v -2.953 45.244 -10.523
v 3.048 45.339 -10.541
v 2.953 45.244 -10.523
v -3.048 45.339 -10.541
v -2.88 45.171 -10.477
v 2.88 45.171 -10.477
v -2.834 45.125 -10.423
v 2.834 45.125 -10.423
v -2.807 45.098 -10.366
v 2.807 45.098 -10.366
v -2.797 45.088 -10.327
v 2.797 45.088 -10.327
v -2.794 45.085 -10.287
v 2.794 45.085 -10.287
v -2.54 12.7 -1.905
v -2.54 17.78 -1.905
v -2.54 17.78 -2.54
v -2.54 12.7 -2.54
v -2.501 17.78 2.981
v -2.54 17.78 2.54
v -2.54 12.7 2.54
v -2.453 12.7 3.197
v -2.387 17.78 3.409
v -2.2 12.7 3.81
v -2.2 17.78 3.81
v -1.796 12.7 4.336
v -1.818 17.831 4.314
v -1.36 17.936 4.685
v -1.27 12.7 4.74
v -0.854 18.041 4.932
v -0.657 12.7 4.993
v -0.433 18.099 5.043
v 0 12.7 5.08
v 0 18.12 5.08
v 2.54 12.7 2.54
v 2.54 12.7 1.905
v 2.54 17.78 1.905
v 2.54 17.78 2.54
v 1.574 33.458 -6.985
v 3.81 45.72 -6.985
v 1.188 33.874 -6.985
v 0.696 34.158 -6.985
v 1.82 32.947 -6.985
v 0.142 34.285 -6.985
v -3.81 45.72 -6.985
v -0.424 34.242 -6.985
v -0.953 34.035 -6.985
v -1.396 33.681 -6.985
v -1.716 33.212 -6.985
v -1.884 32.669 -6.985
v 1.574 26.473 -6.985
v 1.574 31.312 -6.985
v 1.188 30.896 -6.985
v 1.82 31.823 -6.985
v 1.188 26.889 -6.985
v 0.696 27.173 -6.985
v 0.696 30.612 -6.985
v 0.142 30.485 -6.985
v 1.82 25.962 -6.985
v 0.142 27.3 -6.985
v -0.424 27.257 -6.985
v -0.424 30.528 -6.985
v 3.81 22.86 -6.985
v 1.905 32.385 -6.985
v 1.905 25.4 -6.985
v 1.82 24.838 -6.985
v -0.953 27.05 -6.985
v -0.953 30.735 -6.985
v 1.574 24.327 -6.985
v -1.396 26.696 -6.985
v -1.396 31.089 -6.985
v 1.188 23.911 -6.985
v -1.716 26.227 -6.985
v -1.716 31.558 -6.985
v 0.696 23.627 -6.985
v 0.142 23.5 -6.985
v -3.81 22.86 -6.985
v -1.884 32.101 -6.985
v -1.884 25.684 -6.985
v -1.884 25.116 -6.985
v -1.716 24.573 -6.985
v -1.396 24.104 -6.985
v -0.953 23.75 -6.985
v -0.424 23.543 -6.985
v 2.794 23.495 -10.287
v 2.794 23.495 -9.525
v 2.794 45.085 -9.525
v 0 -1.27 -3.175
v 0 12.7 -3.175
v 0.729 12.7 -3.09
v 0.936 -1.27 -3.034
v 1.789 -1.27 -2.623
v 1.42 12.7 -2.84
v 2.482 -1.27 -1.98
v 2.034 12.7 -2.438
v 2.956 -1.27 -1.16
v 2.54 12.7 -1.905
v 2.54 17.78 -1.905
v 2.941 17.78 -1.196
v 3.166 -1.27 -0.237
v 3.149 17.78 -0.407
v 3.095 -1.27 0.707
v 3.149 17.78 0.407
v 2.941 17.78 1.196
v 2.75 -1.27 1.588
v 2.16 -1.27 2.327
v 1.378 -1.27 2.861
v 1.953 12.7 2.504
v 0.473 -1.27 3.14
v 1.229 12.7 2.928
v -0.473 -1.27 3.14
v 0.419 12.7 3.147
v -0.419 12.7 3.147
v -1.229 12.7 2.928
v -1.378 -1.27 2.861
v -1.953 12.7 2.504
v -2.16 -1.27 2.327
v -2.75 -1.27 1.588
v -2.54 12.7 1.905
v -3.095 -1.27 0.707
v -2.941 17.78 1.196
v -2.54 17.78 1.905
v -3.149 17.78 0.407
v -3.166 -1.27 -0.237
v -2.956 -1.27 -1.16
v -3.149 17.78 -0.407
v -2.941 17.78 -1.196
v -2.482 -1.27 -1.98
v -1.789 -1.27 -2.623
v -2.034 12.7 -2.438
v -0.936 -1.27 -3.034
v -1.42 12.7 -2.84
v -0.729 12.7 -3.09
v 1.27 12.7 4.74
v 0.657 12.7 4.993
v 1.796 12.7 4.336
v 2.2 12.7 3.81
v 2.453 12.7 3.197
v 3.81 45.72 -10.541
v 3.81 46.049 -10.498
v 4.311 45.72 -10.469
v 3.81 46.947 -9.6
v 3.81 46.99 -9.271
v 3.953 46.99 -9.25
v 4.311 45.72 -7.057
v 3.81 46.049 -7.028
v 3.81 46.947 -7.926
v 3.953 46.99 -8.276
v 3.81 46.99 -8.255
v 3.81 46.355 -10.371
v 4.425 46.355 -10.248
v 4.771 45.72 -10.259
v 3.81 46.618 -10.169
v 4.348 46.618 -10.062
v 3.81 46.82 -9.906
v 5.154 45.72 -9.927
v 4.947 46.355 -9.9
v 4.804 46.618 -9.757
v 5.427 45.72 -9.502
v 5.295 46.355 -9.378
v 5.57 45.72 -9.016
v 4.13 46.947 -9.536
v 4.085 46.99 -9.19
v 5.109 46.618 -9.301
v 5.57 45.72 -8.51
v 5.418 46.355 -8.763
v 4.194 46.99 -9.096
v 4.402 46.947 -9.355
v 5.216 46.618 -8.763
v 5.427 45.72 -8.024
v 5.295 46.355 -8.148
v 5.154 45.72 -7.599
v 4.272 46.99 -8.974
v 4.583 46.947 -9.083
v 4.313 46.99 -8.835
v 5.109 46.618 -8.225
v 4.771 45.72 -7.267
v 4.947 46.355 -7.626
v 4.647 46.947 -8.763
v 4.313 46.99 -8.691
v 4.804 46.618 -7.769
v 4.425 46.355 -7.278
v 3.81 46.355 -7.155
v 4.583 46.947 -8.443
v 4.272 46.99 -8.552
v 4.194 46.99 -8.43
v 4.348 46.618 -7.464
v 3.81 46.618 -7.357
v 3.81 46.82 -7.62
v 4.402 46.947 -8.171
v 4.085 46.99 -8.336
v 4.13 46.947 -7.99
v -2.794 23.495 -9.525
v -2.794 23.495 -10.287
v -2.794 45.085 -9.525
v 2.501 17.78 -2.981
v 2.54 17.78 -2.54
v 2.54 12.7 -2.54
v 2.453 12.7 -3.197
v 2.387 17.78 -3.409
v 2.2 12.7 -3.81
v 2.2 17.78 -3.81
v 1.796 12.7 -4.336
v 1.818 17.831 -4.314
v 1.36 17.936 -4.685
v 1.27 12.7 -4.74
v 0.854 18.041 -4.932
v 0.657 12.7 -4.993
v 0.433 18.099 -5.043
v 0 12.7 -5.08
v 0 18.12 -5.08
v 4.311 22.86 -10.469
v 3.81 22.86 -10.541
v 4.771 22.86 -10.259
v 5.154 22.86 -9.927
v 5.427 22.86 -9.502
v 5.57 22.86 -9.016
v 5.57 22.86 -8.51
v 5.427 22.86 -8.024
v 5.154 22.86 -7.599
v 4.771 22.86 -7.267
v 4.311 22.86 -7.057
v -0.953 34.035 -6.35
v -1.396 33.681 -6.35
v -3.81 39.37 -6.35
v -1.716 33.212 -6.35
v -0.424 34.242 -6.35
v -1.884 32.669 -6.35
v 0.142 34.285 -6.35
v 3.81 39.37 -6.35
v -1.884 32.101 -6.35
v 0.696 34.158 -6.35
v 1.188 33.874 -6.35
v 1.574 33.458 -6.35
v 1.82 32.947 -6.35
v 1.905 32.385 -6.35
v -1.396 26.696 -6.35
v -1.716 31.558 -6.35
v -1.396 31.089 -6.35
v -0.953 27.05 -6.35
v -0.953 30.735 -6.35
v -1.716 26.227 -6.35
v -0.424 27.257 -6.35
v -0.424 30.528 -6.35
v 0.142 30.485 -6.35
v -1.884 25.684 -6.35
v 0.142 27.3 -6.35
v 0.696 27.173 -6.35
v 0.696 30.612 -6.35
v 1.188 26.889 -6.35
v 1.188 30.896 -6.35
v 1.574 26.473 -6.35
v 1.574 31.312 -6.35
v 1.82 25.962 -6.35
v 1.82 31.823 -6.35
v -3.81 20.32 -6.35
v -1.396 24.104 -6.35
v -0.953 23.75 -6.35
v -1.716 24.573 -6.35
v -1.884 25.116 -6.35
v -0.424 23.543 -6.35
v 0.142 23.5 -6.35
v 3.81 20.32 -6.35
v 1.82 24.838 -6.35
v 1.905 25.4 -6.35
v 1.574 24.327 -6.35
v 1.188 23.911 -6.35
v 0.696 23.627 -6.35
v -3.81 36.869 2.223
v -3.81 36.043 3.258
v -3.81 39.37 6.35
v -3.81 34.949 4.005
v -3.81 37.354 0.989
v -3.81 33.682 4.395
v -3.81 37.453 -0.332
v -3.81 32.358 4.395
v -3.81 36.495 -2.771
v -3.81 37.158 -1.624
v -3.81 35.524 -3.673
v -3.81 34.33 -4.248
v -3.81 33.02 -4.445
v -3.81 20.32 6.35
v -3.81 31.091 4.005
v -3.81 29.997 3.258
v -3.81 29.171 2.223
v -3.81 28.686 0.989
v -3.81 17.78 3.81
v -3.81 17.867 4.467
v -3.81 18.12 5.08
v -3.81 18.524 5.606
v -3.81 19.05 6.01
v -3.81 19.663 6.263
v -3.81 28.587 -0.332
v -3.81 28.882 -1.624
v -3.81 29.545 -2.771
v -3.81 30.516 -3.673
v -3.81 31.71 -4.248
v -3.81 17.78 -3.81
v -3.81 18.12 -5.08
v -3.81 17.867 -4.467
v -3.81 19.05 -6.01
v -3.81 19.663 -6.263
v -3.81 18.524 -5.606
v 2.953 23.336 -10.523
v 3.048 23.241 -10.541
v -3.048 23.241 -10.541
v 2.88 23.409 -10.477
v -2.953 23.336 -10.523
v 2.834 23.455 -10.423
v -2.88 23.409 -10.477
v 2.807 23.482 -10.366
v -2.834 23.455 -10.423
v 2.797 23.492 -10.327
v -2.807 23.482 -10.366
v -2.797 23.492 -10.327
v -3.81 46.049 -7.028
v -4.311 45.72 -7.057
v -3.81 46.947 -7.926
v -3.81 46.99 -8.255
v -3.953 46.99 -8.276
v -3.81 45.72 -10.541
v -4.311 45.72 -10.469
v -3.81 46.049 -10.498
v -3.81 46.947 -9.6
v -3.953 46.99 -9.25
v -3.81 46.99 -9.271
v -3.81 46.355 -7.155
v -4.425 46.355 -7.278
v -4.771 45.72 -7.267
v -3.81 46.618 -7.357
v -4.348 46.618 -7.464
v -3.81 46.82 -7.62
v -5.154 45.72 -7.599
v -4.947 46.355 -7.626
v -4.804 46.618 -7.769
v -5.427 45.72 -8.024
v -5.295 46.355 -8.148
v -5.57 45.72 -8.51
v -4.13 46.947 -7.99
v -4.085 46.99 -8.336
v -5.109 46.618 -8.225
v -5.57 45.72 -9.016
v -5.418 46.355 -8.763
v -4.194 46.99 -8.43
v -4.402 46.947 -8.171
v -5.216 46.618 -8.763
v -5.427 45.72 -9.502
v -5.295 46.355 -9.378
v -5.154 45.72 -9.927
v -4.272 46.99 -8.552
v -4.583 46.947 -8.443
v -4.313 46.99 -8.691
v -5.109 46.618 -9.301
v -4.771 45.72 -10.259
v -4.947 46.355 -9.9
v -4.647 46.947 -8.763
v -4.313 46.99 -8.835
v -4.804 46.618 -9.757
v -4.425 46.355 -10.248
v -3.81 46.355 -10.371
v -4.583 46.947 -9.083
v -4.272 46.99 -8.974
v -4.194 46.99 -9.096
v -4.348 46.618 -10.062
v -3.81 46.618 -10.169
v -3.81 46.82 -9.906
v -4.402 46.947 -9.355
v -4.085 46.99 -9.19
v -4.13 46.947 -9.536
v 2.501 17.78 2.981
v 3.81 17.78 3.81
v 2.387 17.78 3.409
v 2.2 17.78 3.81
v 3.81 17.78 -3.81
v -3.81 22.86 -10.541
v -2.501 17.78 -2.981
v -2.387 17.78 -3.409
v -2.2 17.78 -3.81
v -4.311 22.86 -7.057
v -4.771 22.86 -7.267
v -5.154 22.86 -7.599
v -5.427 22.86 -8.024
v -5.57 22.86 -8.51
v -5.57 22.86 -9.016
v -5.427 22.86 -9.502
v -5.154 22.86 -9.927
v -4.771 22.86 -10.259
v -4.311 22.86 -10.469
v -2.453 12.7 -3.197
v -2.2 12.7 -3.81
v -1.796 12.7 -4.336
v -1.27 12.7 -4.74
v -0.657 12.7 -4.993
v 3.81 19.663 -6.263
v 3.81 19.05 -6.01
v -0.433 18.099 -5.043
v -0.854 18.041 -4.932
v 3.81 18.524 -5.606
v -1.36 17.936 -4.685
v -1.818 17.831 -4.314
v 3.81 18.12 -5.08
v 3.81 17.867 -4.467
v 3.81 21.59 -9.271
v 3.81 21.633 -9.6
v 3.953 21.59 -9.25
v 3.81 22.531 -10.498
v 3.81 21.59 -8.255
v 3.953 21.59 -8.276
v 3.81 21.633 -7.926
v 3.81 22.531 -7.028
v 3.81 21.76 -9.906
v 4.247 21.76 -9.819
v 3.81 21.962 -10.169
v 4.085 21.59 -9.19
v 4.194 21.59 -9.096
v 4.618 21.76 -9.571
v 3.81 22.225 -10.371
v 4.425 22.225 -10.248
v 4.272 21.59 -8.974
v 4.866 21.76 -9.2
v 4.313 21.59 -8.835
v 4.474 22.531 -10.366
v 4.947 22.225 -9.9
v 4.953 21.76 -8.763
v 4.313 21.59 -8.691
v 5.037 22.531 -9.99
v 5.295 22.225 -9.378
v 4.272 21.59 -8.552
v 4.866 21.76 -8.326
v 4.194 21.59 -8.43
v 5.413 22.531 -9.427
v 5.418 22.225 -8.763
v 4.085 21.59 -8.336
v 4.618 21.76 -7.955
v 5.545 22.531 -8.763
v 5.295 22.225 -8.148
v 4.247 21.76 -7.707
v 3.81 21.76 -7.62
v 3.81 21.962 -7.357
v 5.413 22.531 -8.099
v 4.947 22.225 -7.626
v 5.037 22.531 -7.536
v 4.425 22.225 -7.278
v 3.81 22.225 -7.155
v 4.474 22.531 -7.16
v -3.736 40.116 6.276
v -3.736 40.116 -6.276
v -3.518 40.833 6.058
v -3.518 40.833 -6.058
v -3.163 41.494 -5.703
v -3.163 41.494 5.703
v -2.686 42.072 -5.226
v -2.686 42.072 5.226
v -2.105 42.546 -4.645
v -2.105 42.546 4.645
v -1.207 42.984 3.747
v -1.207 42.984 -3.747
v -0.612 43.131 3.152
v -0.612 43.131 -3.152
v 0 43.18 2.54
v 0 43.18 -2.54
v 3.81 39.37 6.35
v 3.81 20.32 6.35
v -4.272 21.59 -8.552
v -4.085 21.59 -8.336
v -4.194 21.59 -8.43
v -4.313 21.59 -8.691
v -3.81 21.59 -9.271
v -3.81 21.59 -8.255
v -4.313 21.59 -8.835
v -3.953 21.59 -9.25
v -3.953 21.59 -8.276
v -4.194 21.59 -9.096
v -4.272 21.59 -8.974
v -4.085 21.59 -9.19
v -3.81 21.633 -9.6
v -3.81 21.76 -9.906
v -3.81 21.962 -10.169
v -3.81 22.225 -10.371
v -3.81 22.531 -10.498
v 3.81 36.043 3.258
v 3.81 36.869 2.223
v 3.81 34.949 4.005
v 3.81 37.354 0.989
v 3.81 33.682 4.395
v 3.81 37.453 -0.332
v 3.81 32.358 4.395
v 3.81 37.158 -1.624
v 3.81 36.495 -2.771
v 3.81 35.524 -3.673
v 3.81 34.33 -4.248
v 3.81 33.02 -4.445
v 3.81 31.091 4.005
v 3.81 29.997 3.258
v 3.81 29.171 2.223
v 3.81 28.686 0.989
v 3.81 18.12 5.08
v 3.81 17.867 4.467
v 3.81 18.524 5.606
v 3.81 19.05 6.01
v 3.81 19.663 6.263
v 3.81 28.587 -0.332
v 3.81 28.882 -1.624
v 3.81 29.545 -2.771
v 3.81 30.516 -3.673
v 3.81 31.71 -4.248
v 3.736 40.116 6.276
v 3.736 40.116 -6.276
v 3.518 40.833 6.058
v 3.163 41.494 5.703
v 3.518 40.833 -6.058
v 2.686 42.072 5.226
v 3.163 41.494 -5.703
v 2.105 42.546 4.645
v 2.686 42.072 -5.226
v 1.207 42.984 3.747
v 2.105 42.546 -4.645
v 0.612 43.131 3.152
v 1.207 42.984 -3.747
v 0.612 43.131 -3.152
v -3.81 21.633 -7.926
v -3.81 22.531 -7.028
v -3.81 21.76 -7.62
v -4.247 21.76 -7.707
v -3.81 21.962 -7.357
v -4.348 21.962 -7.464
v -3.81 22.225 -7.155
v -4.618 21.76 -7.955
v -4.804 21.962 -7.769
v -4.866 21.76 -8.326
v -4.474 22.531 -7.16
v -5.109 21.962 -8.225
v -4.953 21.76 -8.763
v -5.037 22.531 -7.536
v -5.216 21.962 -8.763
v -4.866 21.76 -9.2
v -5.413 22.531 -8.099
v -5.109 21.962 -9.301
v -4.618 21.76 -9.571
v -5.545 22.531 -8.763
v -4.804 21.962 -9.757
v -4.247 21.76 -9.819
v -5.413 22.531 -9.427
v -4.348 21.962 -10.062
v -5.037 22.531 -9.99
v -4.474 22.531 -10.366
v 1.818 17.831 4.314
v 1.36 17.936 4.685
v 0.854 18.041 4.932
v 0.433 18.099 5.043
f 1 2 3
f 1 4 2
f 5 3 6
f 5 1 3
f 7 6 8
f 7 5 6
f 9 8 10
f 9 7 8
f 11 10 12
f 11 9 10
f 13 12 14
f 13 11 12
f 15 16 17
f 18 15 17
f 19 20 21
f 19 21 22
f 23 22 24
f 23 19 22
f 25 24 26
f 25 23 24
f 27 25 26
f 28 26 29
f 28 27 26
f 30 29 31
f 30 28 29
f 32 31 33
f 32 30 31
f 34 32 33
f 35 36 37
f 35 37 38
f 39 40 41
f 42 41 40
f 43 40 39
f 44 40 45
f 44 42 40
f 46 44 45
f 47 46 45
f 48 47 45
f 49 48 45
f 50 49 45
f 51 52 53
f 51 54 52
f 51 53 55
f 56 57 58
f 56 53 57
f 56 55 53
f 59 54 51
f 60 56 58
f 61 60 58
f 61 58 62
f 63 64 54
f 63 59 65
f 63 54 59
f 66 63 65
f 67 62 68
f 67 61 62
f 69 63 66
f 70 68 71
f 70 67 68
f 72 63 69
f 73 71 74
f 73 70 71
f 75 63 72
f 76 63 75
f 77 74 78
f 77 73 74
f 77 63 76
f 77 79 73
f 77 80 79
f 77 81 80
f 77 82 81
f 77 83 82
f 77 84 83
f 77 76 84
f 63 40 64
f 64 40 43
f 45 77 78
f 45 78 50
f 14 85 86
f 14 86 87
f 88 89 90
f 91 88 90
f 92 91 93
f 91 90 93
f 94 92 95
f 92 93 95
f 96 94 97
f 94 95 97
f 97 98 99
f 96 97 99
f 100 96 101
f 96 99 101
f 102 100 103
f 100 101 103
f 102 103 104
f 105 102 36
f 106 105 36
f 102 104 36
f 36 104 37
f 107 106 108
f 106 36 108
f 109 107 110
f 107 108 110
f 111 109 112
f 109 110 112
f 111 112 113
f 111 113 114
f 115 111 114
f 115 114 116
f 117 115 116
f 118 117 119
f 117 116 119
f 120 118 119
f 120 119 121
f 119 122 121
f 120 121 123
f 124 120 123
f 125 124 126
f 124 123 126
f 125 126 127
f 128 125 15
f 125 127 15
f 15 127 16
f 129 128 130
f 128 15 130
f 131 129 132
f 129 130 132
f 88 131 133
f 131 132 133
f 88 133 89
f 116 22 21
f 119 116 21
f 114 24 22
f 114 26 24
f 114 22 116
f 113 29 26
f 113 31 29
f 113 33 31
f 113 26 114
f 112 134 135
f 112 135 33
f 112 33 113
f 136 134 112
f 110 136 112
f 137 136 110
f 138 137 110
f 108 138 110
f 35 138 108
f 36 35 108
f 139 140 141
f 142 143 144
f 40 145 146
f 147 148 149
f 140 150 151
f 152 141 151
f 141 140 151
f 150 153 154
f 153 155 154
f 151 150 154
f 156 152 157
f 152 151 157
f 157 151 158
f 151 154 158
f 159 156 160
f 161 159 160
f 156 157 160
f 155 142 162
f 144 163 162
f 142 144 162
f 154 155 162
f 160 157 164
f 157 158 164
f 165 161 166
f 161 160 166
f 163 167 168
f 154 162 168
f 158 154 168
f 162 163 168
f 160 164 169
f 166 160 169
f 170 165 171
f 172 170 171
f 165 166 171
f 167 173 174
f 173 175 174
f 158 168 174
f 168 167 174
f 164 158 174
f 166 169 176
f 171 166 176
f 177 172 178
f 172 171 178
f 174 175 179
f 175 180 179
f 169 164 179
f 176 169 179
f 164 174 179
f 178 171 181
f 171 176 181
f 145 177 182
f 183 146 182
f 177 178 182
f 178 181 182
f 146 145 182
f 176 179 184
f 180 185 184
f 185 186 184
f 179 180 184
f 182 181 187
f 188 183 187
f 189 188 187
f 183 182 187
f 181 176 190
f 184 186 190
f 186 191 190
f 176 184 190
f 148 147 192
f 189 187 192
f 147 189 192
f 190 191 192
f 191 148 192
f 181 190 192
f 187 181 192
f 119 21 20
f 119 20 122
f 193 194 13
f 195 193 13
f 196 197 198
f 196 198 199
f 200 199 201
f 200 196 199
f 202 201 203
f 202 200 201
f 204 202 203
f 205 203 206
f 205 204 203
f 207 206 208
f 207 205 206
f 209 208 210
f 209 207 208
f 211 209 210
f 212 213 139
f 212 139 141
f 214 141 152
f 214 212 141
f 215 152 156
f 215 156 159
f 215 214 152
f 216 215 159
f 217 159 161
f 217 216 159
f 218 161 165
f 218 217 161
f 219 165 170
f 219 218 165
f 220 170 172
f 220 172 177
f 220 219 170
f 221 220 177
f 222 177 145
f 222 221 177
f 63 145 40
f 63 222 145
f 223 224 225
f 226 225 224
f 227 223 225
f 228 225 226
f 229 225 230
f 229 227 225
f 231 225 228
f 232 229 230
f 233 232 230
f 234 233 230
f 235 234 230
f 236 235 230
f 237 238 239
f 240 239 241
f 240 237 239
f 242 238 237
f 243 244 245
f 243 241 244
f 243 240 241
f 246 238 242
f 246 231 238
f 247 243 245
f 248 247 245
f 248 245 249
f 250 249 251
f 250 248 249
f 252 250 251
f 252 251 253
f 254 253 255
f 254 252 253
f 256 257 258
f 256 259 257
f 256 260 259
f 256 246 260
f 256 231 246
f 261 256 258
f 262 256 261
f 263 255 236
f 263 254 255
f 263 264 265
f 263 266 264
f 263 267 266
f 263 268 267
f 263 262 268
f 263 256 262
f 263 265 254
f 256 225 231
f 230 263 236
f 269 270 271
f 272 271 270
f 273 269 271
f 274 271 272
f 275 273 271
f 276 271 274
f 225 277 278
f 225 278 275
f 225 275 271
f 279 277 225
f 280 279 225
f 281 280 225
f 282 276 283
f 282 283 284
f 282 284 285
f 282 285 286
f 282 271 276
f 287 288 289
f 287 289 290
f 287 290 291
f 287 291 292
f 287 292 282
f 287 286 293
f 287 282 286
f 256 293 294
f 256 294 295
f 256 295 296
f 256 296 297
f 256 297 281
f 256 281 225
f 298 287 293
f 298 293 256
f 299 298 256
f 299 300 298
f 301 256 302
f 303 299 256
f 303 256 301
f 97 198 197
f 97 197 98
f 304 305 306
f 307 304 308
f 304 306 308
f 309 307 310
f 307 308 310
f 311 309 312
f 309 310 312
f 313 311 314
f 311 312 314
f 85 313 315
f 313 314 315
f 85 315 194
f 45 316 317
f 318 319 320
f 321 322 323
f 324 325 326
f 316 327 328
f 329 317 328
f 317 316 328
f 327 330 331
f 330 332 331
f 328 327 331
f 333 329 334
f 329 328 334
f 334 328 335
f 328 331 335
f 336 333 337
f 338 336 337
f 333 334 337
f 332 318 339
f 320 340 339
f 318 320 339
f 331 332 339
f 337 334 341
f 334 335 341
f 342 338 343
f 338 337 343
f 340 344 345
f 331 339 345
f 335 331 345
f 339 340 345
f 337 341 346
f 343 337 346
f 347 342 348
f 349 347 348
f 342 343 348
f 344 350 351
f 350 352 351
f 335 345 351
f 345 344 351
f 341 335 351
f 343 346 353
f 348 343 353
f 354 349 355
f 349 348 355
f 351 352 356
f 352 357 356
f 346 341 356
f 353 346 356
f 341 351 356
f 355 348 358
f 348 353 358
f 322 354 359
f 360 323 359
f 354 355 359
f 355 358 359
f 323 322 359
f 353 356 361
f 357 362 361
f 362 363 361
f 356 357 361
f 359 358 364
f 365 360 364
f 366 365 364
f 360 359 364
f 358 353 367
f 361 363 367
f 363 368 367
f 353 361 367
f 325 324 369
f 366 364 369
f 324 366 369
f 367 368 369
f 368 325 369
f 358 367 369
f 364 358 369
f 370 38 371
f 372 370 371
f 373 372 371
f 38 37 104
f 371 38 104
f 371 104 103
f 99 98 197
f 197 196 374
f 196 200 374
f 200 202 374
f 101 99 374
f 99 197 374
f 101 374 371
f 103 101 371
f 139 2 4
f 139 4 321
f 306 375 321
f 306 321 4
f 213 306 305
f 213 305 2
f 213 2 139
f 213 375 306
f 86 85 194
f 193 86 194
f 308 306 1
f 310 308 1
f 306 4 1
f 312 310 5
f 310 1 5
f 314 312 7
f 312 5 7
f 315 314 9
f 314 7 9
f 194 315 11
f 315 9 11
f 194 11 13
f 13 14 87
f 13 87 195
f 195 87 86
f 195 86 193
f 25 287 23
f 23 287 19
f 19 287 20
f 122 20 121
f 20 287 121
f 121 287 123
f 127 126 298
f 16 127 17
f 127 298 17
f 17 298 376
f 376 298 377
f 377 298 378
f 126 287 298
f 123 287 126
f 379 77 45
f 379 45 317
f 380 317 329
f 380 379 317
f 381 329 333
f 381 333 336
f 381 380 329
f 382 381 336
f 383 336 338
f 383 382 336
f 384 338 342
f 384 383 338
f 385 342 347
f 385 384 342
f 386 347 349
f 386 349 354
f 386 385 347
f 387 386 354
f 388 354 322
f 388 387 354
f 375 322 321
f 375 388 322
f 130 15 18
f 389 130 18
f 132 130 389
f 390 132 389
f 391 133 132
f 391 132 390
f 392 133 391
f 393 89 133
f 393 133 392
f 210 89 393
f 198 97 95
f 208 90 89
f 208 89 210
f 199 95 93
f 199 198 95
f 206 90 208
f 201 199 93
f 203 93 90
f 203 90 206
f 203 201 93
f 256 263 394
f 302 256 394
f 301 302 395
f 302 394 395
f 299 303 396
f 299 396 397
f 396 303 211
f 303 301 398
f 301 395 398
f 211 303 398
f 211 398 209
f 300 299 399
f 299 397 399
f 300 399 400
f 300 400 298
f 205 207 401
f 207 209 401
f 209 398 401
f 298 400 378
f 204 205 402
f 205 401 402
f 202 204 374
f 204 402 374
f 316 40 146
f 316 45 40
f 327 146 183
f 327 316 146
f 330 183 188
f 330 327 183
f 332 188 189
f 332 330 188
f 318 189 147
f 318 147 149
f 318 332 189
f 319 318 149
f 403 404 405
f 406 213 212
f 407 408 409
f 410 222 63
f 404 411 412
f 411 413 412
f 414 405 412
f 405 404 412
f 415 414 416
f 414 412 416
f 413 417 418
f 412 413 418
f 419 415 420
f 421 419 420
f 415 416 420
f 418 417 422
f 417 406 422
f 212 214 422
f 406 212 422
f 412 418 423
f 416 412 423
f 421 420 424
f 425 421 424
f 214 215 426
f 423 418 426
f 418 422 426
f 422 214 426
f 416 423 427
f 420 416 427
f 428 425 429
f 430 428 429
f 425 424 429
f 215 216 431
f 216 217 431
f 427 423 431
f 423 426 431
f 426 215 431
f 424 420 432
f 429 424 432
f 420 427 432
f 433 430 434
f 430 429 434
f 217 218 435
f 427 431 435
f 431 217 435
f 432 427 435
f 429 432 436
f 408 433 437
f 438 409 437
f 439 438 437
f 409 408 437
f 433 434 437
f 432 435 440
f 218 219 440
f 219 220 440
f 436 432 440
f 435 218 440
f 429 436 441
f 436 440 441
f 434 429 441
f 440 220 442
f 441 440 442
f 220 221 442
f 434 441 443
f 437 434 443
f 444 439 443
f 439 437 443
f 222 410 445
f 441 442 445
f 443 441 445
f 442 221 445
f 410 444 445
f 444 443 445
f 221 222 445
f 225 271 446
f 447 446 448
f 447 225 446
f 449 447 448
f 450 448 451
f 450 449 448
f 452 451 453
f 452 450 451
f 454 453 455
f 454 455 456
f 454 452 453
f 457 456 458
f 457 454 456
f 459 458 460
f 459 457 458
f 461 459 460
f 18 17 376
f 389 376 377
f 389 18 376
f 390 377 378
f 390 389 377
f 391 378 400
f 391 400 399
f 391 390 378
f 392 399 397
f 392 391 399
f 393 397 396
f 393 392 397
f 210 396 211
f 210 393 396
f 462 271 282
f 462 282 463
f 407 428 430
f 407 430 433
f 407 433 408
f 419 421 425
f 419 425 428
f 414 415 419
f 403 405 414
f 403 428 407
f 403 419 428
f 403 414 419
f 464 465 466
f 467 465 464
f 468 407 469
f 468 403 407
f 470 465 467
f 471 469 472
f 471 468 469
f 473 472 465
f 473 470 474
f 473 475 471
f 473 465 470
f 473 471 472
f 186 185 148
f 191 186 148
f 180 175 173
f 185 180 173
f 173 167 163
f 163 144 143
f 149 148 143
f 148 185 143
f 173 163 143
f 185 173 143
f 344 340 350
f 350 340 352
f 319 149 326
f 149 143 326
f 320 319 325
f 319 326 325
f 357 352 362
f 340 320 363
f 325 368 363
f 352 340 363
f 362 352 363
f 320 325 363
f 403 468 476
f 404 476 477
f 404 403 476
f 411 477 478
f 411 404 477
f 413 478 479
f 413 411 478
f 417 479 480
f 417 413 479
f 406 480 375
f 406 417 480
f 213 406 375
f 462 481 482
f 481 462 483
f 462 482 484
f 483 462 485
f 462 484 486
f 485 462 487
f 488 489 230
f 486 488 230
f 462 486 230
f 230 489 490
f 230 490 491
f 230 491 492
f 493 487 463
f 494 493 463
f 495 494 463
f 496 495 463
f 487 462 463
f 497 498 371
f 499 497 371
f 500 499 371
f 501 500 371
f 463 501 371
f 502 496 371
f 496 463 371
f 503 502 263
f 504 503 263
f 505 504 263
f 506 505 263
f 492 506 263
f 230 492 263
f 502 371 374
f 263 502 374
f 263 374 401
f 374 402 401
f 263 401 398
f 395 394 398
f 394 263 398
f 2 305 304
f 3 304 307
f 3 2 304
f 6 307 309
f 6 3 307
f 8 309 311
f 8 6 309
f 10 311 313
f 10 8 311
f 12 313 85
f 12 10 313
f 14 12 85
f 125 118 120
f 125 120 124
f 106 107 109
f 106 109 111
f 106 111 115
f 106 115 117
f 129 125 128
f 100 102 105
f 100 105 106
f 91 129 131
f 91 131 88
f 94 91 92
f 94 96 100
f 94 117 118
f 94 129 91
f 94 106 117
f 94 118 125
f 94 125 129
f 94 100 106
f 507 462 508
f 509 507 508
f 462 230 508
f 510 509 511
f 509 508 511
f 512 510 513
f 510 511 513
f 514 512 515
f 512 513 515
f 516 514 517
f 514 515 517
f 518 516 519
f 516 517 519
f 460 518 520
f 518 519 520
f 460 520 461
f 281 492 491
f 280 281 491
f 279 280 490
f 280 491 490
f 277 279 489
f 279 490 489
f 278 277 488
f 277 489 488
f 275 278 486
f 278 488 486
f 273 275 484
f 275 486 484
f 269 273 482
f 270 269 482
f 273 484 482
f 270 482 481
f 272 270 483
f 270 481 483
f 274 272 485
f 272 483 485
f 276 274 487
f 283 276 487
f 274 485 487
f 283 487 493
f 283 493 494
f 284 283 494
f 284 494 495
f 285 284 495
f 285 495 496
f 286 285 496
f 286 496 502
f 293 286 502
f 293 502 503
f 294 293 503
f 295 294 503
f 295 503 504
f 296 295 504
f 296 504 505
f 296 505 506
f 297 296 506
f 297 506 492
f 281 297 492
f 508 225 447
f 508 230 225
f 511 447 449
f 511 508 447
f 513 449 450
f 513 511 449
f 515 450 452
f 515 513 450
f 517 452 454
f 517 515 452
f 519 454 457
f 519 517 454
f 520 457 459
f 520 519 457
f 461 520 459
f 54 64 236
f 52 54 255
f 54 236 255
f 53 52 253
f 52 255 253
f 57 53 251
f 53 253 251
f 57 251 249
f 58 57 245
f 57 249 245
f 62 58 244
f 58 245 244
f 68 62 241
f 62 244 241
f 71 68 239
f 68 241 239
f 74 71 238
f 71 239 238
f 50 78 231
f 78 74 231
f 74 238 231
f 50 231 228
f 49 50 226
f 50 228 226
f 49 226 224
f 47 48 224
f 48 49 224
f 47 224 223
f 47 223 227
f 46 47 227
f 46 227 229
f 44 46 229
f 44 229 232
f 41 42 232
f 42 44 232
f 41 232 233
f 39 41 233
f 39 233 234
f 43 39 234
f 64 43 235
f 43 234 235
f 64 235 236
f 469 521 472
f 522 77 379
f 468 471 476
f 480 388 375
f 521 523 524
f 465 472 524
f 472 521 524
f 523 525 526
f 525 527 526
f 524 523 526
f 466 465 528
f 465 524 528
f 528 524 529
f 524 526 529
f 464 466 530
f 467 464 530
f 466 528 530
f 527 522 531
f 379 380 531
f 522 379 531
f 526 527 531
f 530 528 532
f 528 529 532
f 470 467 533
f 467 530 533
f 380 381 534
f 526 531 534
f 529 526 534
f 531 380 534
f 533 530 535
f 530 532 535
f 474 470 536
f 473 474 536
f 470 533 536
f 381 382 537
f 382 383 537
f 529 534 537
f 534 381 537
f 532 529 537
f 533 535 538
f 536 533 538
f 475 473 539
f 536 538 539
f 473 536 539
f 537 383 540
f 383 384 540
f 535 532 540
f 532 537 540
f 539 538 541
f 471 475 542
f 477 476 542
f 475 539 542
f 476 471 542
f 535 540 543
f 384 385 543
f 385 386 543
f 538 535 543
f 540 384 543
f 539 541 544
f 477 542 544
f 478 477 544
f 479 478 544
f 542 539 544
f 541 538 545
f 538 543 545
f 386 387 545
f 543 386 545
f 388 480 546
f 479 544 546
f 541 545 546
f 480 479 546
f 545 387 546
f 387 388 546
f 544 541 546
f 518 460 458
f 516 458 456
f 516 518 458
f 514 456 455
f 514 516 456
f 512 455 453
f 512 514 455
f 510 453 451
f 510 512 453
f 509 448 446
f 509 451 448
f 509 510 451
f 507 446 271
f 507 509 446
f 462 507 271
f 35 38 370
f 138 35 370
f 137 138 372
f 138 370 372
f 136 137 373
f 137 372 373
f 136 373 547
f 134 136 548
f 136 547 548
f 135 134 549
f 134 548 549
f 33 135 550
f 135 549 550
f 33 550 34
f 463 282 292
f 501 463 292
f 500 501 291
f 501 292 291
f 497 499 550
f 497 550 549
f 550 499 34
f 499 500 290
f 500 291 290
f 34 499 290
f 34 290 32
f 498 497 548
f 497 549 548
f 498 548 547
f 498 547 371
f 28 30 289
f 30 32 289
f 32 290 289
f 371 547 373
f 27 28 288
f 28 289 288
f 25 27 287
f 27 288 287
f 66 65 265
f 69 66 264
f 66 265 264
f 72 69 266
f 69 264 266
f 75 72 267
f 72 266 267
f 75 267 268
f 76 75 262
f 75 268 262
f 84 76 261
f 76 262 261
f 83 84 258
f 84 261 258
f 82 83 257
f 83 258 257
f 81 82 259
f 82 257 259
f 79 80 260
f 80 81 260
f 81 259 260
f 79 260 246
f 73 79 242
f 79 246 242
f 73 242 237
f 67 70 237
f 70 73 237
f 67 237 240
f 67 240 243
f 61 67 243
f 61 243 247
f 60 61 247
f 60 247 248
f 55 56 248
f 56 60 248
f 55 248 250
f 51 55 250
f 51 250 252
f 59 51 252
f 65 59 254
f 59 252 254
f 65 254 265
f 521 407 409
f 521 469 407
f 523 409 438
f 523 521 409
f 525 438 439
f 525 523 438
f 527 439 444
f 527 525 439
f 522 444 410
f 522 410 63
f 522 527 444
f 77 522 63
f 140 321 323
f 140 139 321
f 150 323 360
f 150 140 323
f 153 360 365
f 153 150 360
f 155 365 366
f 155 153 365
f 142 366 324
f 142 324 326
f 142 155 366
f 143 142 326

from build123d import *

# Parameters (mm, degrees)
SKETCH1_W                = 15.24
SKETCH1_H                = 25.4
BOSS_EXTRUDE1_DEPTH      = 5.08
FILLET1_R                = 2.54
SKETCH2_R                = 3.175
BOSS_EXTRUDE2_DEPTH      = 6.35
SKETCH3_W                = 5.08
SKETCH3_H                = 10.16
BOSS_EXTRUDE3_DEPTH      = 5.08
SKETCH4_W                = 7.62
SKETCH4_H                = 12.7
BOSS_EXTRUDE4_DEPTH      = 25.4
FILLET2_R                = 2.54
FILLET3_R                = 3.81
SKETCH5_R                = 1.905
BOSS_EXTRUDE5_DEPTH      = 1.27
BOSS_EXTRUDE6_DEPTH      = 25.4
FILLET4_R                = 1.27
SKETCH7_W                = 5.588
SKETCH7_H                = 21.59
CUT_EXTRUDE1_DEPTH       = 1.016
FILLET5_R                = 0.254
CUT_EXTRUDE2_REACH       = 52.512
SKETCH8_R                = 4.445
FILLET6_R                = 0.635
CUT_EXTRUDE3_REACH       = 55.308
SKETCH9_W                = 15.24
SKETCH9_H                = 25.4
BOSS_EXTRUDE7_DEPTH      = 13.97
BOSS_EXTRUDE7_DEPTH_BACK = 5.08
SKETCH10_R               = 3.175
FILLET7_R                = 2.54


# Some blends are built 0.0001 mm under size
with BuildPart() as part:
    # Sketch1 → Boss-Extrude1 (new, symmetric)
    with BuildSketch(Plane(origin=(0, 0, 0), x_dir=(0, 0, -1), z_dir=(1, 0, 0))):
        Rectangle(SKETCH1_W, SKETCH1_H)
    extrude(amount=BOSS_EXTRUDE1_DEPTH, both=True)

    # Fillet1
    fillet1_edges = [part.edges().sort_by_distance(p)[0] for p in [
        (5.08, 0, 7.62),
        (5.08, -12.7, 0),
        (5.08, 0, -7.62),
        (-5.08, -12.7, 0),
        (-5.08, 0, 7.62),
        (-5.08, 12.7, 0),
        (-5.08, 0, -7.62),
        (5.08, 12.7, 0),
        (0, -12.7, -7.62),
        (0, -12.7, 7.62),
        (0, 12.7, 7.62),
        (0, 12.7, -7.62),
    ]]
    fillet(fillet1_edges, radius=FILLET1_R)

    # Sketch2 → Boss-Extrude2 (add)
    with BuildSketch(Plane(origin=(5.08, 0, 0), x_dir=(0, 0, -1), z_dir=(1, 0, 0))):
        with Locations(Location((0, 6.985, 0), (0, 0, 90))):
            Circle(SKETCH2_R)
        with Locations(Location((0, -6.985, 0), (0, 0, 270))):
            Circle(SKETCH2_R)
    boss_extrude2 = extrude(amount=BOSS_EXTRUDE2_DEPTH)

    # Mirror1: Boss-Extrude2 across plane
    add(boss_extrude2.mirror(Plane(origin=(0, 0, 0), x_dir=(0, 0, 1), z_dir=(1, 0, 0))))

    # Sketch3 → Boss-Extrude3 (add)
    with BuildSketch(Plane(origin=(0, 12.7, 0), x_dir=(1, 0, 0), z_dir=(0, 1, 0))):
        Rectangle(SKETCH3_W, SKETCH3_H)
    extrude(amount=BOSS_EXTRUDE3_DEPTH)

    # Sketch4 → Boss-Extrude4 (add)
    with BuildSketch(Plane(origin=(0, 17.78, 0), x_dir=(1, 0, 0), z_dir=(0, 1, 0))):
        Rectangle(SKETCH4_W, SKETCH4_H)
    extrude(amount=BOSS_EXTRUDE4_DEPTH)

    # Fillet2
    # the kernel refuses this fillet: 2.54 mm, written as the material it takes off along each edge
    with BuildSketch(Plane(origin=(10.16, 17.78, -6.35), x_dir=(0, 0, 1), z_dir=(-1, 0, 0))) as fillet2_piece_1_section:
        with BuildLine():
            CenterArc((FILLET2_R, FILLET2_R), FILLET2_R, 180, 90)
            Line((0, FILLET2_R), (0, 0))
            Line((0, 0), (FILLET2_R, 0))
        make_face()
    fillet2_piece_1 = extrude(amount=20.32, mode=Mode.PRIVATE)
    fillet2_piece_1 = split(fillet2_piece_1, bisect_by=Plane(origin=(6.35, 17.840981289, -5.08), z_dir=(0, 0, 1)), keep=Keep.TOP, mode=Mode.PRIVATE)
    fillet2_piece_1 = split(fillet2_piece_1, bisect_by=Plane(origin=(2.54, 17.840981289, -4.665343007), z_dir=(1, 0, 0)), keep=Keep.TOP, mode=Mode.PRIVATE)
    add(fillet2_piece_1, mode=Mode.SUBTRACT)
    with BuildSketch(Plane(origin=(10.16, 17.78, -6.35), x_dir=(0, 0, 1), z_dir=(-1, 0, 0))) as fillet2_piece_2_section:
        with BuildLine():
            CenterArc((FILLET2_R, FILLET2_R), FILLET2_R, 180, 90)
            Line((0, FILLET2_R), (0, 0))
            Line((0, 0), (FILLET2_R, 0))
        make_face()
    fillet2_piece_2 = extrude(amount=20.32, mode=Mode.PRIVATE)
    fillet2_piece_2 = split(fillet2_piece_2, bisect_by=Plane(origin=(6.35, 18.428004952, -5.08), z_dir=(0, 0, -1)), keep=Keep.TOP, mode=Mode.PRIVATE)
    fillet2_piece_2 = split(fillet2_piece_2, bisect_by=Plane(origin=(2.54, 18.428004952, -5.932444919), z_dir=(1, 0, 0)), keep=Keep.TOP, mode=Mode.PRIVATE)
    add(fillet2_piece_2, mode=Mode.SUBTRACT)
    with BuildSketch(Plane(origin=(10.16, 17.78, -6.35), x_dir=(0, 0, 1), z_dir=(-1, 0, 0))) as fillet2_piece_3_section:
        with BuildLine():
            CenterArc((FILLET2_R, FILLET2_R), FILLET2_R, 180, 90)
            Line((0, FILLET2_R), (0, 0))
            Line((0, 0), (FILLET2_R, 0))
        make_face()
    fillet2_piece_3 = extrude(amount=20.32, mode=Mode.PRIVATE)
    fillet2_piece_3 = split(fillet2_piece_3, bisect_by=Plane(origin=(0, 18.428004952, -5.08), z_dir=(0, 0, -1)), keep=Keep.TOP, mode=Mode.PRIVATE)
    fillet2_piece_3 = split(fillet2_piece_3, bisect_by=Plane(origin=(-2.54, 18.428004952, -5.932444919), z_dir=(1, 0, 0)), keep=Keep.TOP, mode=Mode.PRIVATE)
    fillet2_piece_3 = split(fillet2_piece_3, bisect_by=Plane(origin=(2.54, 18.428004952, -5.932444919), z_dir=(-1, 0, 0)), keep=Keep.TOP, mode=Mode.PRIVATE)
    add(fillet2_piece_3, mode=Mode.SUBTRACT)
    with BuildSketch(Plane(origin=(10.16, 17.78, -6.35), x_dir=(0, 0, 1), z_dir=(-1, 0, 0))) as fillet2_piece_4_section:
        with BuildLine():
            CenterArc((FILLET2_R, FILLET2_R), FILLET2_R, 180, 90)
            Line((0, FILLET2_R), (0, 0))
            Line((0, 0), (FILLET2_R, 0))
        make_face()
    fillet2_piece_4 = extrude(amount=20.32, mode=Mode.PRIVATE)
    fillet2_piece_4 = split(fillet2_piece_4, bisect_by=Plane(origin=(-6.35, 17.840981289, -5.08), z_dir=(0, 0, 1)), keep=Keep.TOP, mode=Mode.PRIVATE)
    fillet2_piece_4 = split(fillet2_piece_4, bisect_by=Plane(origin=(-2.54, 17.840981289, -4.665343007), z_dir=(-1, 0, 0)), keep=Keep.TOP, mode=Mode.PRIVATE)
    add(fillet2_piece_4, mode=Mode.SUBTRACT)
    with BuildSketch(Plane(origin=(10.16, 17.78, -6.35), x_dir=(0, 0, 1), z_dir=(-1, 0, 0))) as fillet2_piece_5_section:
        with BuildLine():
            CenterArc((FILLET2_R, FILLET2_R), FILLET2_R, 180, 90)
            Line((0, FILLET2_R), (0, 0))
            Line((0, 0), (FILLET2_R, 0))
        make_face()
    fillet2_piece_5 = extrude(amount=20.32, mode=Mode.PRIVATE)
    fillet2_piece_5 = split(fillet2_piece_5, bisect_by=Plane(origin=(-6.35, 18.428004952, -5.08), z_dir=(0, 0, -1)), keep=Keep.TOP, mode=Mode.PRIVATE)
    fillet2_piece_5 = split(fillet2_piece_5, bisect_by=Plane(origin=(-2.54, 18.428004952, -5.932444919), z_dir=(-1, 0, 0)), keep=Keep.TOP, mode=Mode.PRIVATE)
    add(fillet2_piece_5, mode=Mode.SUBTRACT)
    with BuildSketch(Plane(origin=(-10.16, 17.78, 6.35), x_dir=(0, 1, 0), z_dir=(1, 0, 0))) as fillet2_piece_6_section:
        with BuildLine():
            CenterArc((FILLET2_R, -FILLET2_R), FILLET2_R, 90, 90)
            Line((0, -FILLET2_R), (0, 0))
            Line((0, 0), (FILLET2_R, 0))
        make_face()
    fillet2_piece_6 = extrude(amount=20.32, mode=Mode.PRIVATE)
    fillet2_piece_6 = split(fillet2_piece_6, bisect_by=Plane(origin=(-2.54, 18.428004952, 5.932444919), z_dir=(-1, 0, 0)), keep=Keep.TOP, mode=Mode.PRIVATE)
    fillet2_piece_6 = split(fillet2_piece_6, bisect_by=Plane(origin=(-6.35, 18.428004952, 5.08), z_dir=(0, 0, 1)), keep=Keep.TOP, mode=Mode.PRIVATE)
    add(fillet2_piece_6, mode=Mode.SUBTRACT)
    with BuildSketch(Plane(origin=(-10.16, 17.78, 6.35), x_dir=(0, 1, 0), z_dir=(1, 0, 0))) as fillet2_piece_7_section:
        with BuildLine():
            CenterArc((FILLET2_R, -FILLET2_R), FILLET2_R, 90, 90)
            Line((0, -FILLET2_R), (0, 0))
            Line((0, 0), (FILLET2_R, 0))
        make_face()
    fillet2_piece_7 = extrude(amount=20.32, mode=Mode.PRIVATE)
    fillet2_piece_7 = split(fillet2_piece_7, bisect_by=Plane(origin=(-2.54, 17.840981289, 4.665343007), z_dir=(-1, 0, 0)), keep=Keep.TOP, mode=Mode.PRIVATE)
    fillet2_piece_7 = split(fillet2_piece_7, bisect_by=Plane(origin=(-6.35, 17.840981289, 5.08), z_dir=(0, 0, -1)), keep=Keep.TOP, mode=Mode.PRIVATE)
    add(fillet2_piece_7, mode=Mode.SUBTRACT)
    with BuildSketch(Plane(origin=(-10.16, 17.78, 6.35), x_dir=(0, 1, 0), z_dir=(1, 0, 0))) as fillet2_piece_8_section:
        with BuildLine():
            CenterArc((FILLET2_R, -FILLET2_R), FILLET2_R, 90, 90)
            Line((0, -FILLET2_R), (0, 0))
            Line((0, 0), (FILLET2_R, 0))
        make_face()
    fillet2_piece_8 = extrude(amount=20.32, mode=Mode.PRIVATE)
    fillet2_piece_8 = split(fillet2_piece_8, bisect_by=Plane(origin=(-2.54, 18.428004952, 5.932444919), z_dir=(1, 0, 0)), keep=Keep.TOP, mode=Mode.PRIVATE)
    fillet2_piece_8 = split(fillet2_piece_8, bisect_by=Plane(origin=(0, 18.428004952, 5.08), z_dir=(0, 0, 1)), keep=Keep.TOP, mode=Mode.PRIVATE)
    fillet2_piece_8 = split(fillet2_piece_8, bisect_by=Plane(origin=(2.54, 18.428004952, 5.932444919), z_dir=(-1, 0, 0)), keep=Keep.TOP, mode=Mode.PRIVATE)
    add(fillet2_piece_8, mode=Mode.SUBTRACT)
    with BuildSketch(Plane(origin=(-10.16, 17.78, 6.35), x_dir=(0, 1, 0), z_dir=(1, 0, 0))) as fillet2_piece_9_section:
        with BuildLine():
            CenterArc((FILLET2_R, -FILLET2_R), FILLET2_R, 90, 90)
            Line((0, -FILLET2_R), (0, 0))
            Line((0, 0), (FILLET2_R, 0))
        make_face()
    fillet2_piece_9 = extrude(amount=20.32, mode=Mode.PRIVATE)
    fillet2_piece_9 = split(fillet2_piece_9, bisect_by=Plane(origin=(6.35, 18.428004952, 5.08), z_dir=(0, 0, 1)), keep=Keep.TOP, mode=Mode.PRIVATE)
    fillet2_piece_9 = split(fillet2_piece_9, bisect_by=Plane(origin=(2.54, 18.428004952, 5.932444919), z_dir=(1, 0, 0)), keep=Keep.TOP, mode=Mode.PRIVATE)
    add(fillet2_piece_9, mode=Mode.SUBTRACT)
    with BuildSketch(Plane(origin=(-10.16, 17.78, 6.35), x_dir=(0, 1, 0), z_dir=(1, 0, 0))) as fillet2_piece_10_section:
        with BuildLine():
            CenterArc((FILLET2_R, -FILLET2_R), FILLET2_R, 90, 90)
            Line((0, -FILLET2_R), (0, 0))
            Line((0, 0), (FILLET2_R, 0))
        make_face()
    fillet2_piece_10 = extrude(amount=20.32, mode=Mode.PRIVATE)
    fillet2_piece_10 = split(fillet2_piece_10, bisect_by=Plane(origin=(6.35, 17.840981289, 5.08), z_dir=(0, 0, -1)), keep=Keep.TOP, mode=Mode.PRIVATE)
    fillet2_piece_10 = split(fillet2_piece_10, bisect_by=Plane(origin=(2.54, 17.840981289, 4.665343007), z_dir=(1, 0, 0)), keep=Keep.TOP, mode=Mode.PRIVATE)
    add(fillet2_piece_10, mode=Mode.SUBTRACT)

    # Fillet3
    fillet3_edges = [part.edges().sort_by_distance(p)[0] for p in [
        (3.81, 43.18, 0),
        (0, 43.18, -6.35),
        (-3.81, 43.18, 0),
        (0, 43.18, 6.35),
    ]]
    fillet(fillet3_edges, radius=FILLET3_R - 0.0001)  # a hair under: the kernel refuses the full size

    # Sketch5 → Boss-Extrude5 (add)
    with BuildSketch(Plane(origin=(0, 0, -6.35), x_dir=(-1, 0, 0), z_dir=(0, 0, -1))):
        with Locations(Location((0, 32.385, 0), (0, 0, 180))):
            Circle(SKETCH5_R)
        with Locations(Location((0, 25.4, 0), (0, 0, 180))):
            Circle(SKETCH5_R)
    extrude(amount=BOSS_EXTRUDE5_DEPTH)

    # Sketch6 → Boss-Extrude6 (add)
    with BuildSketch(Plane(origin=(0, 21.59, 0), x_dir=(1, 0, 0), z_dir=(0, 1, 0))):
        with BuildLine():
            Line((-3.81, 10.541), (3.81, 10.541))
            ThreePointArc((3.81, 10.541), (5.588, 8.763), (3.81, 6.985))
            Line((3.81, 6.985), (-3.81, 6.985))
            ThreePointArc((-3.81, 6.985), (-5.588, 8.763), (-3.81, 10.541))
        make_face()
    extrude(amount=BOSS_EXTRUDE6_DEPTH)

    # Fillet4
    fillet4_edges = [part.edges().sort_by_distance(p)[0] for p in [
        (0, 21.59, -6.985),
        (-5.588, 21.59, -8.763),
        (5.588, 21.59, -8.763),
        (0, 21.59, -10.541),
        (-5.588, 46.99, -8.763),
        (0, 46.99, -6.985),
        (5.588, 46.99, -8.763),
        (0, 46.99, -10.541),
    ]]
    fillet(fillet4_edges, radius=FILLET4_R)

    # Sketch7 → Cut-Extrude1 (cut)
    with BuildSketch(Plane(origin=(0, 0, -10.541), x_dir=(-1, 0, 0), z_dir=(0, 0, -1))):
        with Locations((0, 34.29)):
            Rectangle(SKETCH7_W, SKETCH7_H)
    extrude(amount=-CUT_EXTRUDE1_DEPTH, mode=Mode.SUBTRACT)

    # Fillet5
    fillet5_edges = [part.edges().sort_by_distance(p)[0] for p in [
        (-2.794, 34.29, -10.541),
        (0, 45.085, -10.541),
        (2.794, 34.29, -10.541),
        (0, 23.495, -10.541),
    ]]
    fillet(fillet5_edges, radius=FILLET5_R)

    # Sketch8 → Cut-Extrude2 (cut, up to next)
    with BuildSketch(Plane(origin=(3.81, 0, 0), x_dir=(0, 0, -1), z_dir=(1, 0, 0)), mode=Mode.PRIVATE) as cut_extrude2_sk1:
        with Locations((0, 33.02)):
            Circle(SKETCH8_R)
    cut_extrude2_tool1 = extrude(cut_extrude2_sk1.sketch, amount=-CUT_EXTRUDE2_REACH, mode=Mode.PRIVATE) & part.part
    add(cut_extrude2_tool1.solids().sort_by_distance((3.81, 33.02, 0))[0], mode=Mode.SUBTRACT)

    # Fillet6
    fillet6_edges = [part.edges().sort_by_distance(p)[0] for p in [
        (11.43, 3.81, 0),
        (11.43, -3.81, 0),
        (-11.43, 3.81, 0),
        (-11.43, -3.81, 0),
    ]]
    fillet(fillet6_edges, radius=FILLET6_R)

    # Sketch9 → Cut-Extrude3 (cut, up to next)
    with BuildSketch(Plane(origin=(11.43, 0, 0), x_dir=(0, 0, -1), z_dir=(1, 0, 0)), mode=Mode.PRIVATE) as cut_extrude3_sk1:
        Rectangle(SKETCH9_W, SKETCH9_H)
    cut_extrude3_tool1 = extrude(cut_extrude3_sk1.sketch, amount=-CUT_EXTRUDE3_REACH, mode=Mode.PRIVATE) & part.part
    add(cut_extrude3_tool1.solids().sort_by_distance((11.43, 0, 0))[0], mode=Mode.SUBTRACT)

    # Sketch10 → Boss-Extrude7 (add, two sides: drawn at the far end of the back side and taken through both)
    with BuildSketch(Plane.XZ.offset(-12.7).offset(-BOSS_EXTRUDE7_DEPTH_BACK)):
        with Locations(Location((0, 0, 0), (0, 0, 270))):
            Circle(SKETCH10_R)
    extrude(amount=BOSS_EXTRUDE7_DEPTH + BOSS_EXTRUDE7_DEPTH_BACK)

    # Fillet7
    fillet7_edges = [part.edges().sort_by_distance(p)[0] for p in [
        (-2.54, 15.410147737, 5.08),
        (2.54, 15.410147737, 5.08),
        (-2.54, 15.410147737, -5.08),
        (2.54, 15.410147737, -5.08),
    ]]
    fillet(fillet7_edges, radius=FILLET7_R - 0.0001)  # a hair under: the kernel refuses the full size


solid = part.part
